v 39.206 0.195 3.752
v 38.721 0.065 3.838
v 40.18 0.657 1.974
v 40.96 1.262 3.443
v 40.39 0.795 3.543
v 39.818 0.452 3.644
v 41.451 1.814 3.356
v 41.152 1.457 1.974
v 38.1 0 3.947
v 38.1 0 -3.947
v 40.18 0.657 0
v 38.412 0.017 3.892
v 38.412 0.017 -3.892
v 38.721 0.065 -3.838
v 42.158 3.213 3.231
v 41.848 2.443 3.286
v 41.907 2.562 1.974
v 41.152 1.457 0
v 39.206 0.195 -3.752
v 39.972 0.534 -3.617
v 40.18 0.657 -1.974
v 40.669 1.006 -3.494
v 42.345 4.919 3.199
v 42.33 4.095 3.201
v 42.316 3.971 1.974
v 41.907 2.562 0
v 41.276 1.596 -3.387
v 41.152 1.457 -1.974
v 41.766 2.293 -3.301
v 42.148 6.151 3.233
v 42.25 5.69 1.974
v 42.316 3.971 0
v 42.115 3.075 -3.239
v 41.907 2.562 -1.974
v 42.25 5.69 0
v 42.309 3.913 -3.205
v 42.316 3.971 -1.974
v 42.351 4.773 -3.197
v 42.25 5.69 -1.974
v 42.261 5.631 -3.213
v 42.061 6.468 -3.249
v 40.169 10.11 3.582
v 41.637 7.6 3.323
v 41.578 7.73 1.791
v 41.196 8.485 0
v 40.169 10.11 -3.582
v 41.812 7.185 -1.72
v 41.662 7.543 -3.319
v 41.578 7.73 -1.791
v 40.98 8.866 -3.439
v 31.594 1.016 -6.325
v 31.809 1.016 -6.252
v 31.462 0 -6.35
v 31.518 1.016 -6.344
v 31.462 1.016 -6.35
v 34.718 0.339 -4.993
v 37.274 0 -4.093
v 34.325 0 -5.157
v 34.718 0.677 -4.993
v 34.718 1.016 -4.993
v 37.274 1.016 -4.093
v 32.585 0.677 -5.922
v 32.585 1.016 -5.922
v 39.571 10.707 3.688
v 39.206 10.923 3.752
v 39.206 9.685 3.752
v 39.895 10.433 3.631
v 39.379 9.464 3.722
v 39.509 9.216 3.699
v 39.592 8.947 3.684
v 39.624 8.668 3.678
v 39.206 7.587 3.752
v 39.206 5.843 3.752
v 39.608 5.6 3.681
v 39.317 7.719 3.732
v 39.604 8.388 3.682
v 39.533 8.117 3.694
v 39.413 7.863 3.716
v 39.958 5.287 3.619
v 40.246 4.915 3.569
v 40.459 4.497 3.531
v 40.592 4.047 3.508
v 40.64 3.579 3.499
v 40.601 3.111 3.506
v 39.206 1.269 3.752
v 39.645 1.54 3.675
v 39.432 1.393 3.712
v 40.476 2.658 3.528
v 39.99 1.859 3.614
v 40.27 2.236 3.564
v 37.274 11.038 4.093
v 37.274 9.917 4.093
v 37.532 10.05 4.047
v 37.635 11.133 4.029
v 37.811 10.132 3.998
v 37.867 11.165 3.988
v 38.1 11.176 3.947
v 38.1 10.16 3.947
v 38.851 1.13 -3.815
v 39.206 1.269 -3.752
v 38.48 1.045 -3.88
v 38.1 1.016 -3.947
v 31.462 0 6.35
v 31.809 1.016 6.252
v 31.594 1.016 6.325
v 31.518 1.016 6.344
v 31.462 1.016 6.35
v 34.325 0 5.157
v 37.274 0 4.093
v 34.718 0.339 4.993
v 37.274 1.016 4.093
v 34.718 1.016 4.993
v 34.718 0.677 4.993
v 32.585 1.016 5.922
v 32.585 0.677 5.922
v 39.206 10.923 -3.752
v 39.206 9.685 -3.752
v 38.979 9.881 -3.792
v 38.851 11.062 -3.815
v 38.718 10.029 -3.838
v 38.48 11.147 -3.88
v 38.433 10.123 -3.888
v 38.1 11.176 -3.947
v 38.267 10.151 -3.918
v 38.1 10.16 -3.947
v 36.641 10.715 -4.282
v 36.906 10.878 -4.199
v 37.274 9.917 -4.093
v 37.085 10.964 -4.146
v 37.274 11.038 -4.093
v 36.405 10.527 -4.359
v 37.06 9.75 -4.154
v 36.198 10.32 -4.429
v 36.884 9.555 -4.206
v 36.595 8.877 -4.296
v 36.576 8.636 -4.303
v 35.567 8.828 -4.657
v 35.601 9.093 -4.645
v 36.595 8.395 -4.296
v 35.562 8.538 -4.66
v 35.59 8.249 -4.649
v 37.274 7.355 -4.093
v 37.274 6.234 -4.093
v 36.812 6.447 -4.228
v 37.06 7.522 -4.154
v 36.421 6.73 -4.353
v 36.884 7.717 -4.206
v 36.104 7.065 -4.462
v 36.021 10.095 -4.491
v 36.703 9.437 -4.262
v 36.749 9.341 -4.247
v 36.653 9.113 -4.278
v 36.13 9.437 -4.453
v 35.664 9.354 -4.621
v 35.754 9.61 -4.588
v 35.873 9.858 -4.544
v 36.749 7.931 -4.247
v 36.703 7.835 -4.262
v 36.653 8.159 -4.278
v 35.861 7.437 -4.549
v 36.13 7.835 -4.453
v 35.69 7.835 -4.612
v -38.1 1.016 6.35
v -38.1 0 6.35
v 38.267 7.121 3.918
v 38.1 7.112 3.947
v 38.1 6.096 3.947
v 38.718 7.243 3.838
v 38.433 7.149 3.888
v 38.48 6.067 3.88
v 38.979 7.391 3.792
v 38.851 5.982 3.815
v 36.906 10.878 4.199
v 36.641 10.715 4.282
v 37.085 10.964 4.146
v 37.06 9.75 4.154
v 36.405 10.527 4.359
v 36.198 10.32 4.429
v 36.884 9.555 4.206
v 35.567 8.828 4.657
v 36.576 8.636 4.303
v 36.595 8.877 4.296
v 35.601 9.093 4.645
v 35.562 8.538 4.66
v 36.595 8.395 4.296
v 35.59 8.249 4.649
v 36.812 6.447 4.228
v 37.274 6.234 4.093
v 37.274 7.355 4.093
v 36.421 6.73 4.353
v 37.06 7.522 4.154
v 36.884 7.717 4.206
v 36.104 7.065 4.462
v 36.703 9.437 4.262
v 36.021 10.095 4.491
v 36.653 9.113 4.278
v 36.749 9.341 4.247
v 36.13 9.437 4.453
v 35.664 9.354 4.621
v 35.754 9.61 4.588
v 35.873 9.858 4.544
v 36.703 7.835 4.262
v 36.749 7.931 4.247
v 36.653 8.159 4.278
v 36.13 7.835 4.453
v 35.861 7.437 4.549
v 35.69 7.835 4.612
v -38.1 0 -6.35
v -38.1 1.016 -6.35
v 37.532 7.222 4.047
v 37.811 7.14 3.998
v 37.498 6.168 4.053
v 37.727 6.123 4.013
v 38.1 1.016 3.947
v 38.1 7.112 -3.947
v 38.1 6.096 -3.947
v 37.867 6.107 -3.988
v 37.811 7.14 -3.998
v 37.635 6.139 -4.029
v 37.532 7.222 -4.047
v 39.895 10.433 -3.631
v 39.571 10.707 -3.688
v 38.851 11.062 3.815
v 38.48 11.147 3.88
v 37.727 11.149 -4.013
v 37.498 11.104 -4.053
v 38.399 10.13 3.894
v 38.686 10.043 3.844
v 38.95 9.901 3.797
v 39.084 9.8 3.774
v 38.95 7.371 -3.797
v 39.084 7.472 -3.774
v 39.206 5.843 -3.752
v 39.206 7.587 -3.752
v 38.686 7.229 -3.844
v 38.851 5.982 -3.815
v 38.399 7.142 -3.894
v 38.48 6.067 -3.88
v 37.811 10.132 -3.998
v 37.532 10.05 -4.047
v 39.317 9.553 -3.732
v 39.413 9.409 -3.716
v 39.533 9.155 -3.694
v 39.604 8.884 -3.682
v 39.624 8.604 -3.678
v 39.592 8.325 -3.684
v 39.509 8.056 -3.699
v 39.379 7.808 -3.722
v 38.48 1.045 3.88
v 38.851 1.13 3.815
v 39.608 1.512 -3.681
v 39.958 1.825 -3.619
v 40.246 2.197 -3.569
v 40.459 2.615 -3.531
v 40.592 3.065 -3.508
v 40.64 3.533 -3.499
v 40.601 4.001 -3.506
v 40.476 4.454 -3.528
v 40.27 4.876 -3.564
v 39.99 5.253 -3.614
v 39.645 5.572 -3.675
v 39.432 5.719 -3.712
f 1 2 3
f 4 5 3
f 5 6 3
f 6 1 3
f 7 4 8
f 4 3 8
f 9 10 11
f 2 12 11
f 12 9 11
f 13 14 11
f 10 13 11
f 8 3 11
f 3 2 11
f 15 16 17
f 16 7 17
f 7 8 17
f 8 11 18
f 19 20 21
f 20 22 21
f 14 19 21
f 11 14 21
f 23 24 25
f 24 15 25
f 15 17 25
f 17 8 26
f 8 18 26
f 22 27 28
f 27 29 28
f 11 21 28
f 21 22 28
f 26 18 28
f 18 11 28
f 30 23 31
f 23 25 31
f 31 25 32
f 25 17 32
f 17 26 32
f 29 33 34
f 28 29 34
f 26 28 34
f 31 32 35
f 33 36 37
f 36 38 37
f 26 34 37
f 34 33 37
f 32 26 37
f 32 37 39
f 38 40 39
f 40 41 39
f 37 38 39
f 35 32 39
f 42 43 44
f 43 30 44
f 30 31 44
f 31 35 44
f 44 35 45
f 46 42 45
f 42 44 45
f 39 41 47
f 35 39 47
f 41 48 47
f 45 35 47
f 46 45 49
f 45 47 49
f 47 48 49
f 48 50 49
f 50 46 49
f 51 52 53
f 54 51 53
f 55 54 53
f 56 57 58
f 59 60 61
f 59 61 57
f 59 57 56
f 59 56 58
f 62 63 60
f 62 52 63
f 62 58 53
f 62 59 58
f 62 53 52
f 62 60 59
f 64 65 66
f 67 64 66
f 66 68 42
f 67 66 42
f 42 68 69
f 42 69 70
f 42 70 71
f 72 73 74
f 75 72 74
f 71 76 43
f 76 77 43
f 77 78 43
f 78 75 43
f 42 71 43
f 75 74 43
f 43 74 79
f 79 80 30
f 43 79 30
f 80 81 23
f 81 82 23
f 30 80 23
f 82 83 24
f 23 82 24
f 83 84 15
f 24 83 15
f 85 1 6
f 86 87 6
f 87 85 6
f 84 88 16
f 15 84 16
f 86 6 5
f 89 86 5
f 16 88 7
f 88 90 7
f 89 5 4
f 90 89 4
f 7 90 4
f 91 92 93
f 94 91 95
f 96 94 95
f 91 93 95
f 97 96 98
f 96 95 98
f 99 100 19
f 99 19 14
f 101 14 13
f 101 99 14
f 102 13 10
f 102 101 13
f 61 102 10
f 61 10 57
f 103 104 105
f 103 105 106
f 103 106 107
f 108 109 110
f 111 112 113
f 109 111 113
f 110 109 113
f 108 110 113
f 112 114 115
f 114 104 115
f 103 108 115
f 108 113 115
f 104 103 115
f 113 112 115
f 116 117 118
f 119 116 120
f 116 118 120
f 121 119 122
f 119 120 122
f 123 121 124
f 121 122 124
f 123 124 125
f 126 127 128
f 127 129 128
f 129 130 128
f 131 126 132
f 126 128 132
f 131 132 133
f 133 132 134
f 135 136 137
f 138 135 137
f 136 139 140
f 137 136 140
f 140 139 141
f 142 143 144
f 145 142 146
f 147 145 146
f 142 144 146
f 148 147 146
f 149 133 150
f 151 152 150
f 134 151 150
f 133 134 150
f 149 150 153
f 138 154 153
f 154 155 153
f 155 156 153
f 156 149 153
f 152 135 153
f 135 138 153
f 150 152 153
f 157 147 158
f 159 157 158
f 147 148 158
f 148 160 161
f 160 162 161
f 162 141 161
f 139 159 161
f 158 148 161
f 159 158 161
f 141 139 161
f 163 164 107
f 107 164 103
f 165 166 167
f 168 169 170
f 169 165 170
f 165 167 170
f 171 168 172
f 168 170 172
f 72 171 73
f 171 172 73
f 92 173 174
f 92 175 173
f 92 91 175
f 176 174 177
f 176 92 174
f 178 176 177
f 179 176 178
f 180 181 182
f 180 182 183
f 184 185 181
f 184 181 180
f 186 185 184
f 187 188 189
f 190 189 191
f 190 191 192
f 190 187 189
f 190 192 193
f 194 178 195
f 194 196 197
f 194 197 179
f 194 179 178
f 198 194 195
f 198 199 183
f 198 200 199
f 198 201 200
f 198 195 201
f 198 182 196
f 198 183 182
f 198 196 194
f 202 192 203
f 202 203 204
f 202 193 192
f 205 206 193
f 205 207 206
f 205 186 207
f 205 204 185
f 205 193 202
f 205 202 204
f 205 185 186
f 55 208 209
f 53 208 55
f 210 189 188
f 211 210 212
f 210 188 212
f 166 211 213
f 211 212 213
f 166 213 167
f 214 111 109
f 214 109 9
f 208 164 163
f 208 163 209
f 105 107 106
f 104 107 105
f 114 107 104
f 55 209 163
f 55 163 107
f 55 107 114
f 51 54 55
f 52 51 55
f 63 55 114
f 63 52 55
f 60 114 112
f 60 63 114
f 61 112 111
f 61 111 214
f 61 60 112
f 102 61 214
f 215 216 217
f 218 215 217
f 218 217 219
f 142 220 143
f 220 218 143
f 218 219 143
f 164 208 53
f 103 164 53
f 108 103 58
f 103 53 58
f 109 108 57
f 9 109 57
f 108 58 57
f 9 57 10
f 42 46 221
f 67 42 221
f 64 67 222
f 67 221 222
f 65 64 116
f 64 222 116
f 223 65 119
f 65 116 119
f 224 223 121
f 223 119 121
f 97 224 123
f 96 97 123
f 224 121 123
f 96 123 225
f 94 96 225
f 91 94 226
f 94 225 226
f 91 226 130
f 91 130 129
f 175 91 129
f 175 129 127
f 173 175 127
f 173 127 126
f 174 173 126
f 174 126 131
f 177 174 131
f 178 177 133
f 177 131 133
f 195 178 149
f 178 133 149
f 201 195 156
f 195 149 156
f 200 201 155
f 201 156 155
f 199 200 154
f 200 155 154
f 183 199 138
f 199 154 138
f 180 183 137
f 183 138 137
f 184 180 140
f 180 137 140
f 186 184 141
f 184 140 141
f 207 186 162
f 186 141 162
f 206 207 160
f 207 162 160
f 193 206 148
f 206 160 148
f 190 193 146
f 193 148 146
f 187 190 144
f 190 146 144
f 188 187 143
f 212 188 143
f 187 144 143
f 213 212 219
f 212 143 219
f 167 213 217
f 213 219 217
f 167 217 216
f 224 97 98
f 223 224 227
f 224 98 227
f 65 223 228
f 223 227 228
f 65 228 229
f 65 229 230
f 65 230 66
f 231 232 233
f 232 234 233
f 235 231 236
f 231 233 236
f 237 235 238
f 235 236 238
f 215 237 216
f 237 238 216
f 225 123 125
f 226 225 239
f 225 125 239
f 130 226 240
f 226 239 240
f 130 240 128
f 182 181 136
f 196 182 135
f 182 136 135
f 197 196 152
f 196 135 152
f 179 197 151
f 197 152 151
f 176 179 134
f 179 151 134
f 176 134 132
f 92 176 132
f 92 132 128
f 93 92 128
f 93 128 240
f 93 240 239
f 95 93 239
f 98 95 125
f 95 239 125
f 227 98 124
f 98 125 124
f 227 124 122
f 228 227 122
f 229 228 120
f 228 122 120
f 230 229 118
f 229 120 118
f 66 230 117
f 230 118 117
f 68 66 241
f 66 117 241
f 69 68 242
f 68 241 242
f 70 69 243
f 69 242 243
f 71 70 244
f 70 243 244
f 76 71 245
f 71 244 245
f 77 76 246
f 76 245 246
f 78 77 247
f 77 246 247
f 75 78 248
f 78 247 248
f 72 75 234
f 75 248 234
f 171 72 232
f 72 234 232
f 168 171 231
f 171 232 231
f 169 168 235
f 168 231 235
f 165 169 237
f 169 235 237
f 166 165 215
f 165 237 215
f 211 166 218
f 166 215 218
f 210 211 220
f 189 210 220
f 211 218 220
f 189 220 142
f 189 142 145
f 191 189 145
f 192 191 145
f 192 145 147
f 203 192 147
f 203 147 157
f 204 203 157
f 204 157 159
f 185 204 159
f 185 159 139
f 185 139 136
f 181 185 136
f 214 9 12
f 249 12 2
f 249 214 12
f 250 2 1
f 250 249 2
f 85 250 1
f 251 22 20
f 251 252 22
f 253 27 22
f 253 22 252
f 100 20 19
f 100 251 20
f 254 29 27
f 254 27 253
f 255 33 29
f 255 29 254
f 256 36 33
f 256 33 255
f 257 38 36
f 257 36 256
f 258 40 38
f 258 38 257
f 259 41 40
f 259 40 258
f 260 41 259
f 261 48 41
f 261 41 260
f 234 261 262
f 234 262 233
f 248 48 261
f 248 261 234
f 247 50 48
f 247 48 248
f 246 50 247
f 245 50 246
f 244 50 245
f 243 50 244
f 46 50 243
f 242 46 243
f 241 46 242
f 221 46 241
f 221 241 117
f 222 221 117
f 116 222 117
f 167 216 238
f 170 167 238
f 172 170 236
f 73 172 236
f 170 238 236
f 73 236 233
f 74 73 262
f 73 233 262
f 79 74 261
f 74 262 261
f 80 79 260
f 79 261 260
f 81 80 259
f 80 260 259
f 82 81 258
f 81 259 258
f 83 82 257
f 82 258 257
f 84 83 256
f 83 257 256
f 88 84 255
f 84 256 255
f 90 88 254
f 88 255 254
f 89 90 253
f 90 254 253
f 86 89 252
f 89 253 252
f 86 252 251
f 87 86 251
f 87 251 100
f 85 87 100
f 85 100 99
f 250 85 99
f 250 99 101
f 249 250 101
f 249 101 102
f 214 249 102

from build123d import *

# Parameters (mm, degrees)
SKETCH1_W               = 76.2
SKETCH1_H               = 12.7
BOSS_EXTRUDE1_DEPTH     = 1.016
SKETCH2_R               = 1.524
BOSS_EXTRUDE2_DEPTH     = 12.7
CUT_EXTRUDE1_DEPTH      = 10
CUT_EXTRUDE1_DEPTH_BACK = 11.1600001


with BuildPart() as part:
    # Sketch1 → Boss-Extrude1 (new body)
    with BuildSketch(Plane(origin=(0, 0, 0), x_dir=(1, 0, 0), z_dir=(0, 1, 0))):
        Rectangle(SKETCH1_W, SKETCH1_H)
    extrude(amount=BOSS_EXTRUDE1_DEPTH)

    # Sketch2 → Boss-Extrude2 (add, through all)
    with BuildSketch(Plane(origin=(0, 0, -6.35), x_dir=(-1, 0, 0), z_dir=(0, 0, -1))):
        with BuildLine():
            Line((38.1, 1.016), (38.1, 0))
            Line((38.1, 0), (-38.1, 0))
            add(Edge.make_bspline(
                [(-38.1, 0), (-40.015605578, 0), (-42.822592097, 1.815276702), (-43.811105253, 4.997519765), (-40.168646494, 10.109873022)],
                knots=[0, 0, 0, 0, 0, 1, 1, 1, 1, 1], degree=4))
            ThreePointArc((-40.168646494, 10.109873022), (-35.842209324, 9.799607005), (-38.1, 6.096))
            ThreePointArc((-38.1, 6.096), (-40.64, 3.556), (-38.1, 1.016))
            Line((-38.1, 1.016), (38.1, 1.016))
        make_face()
        with Locations((-38.1, 8.636)):
            Circle(SKETCH2_R, mode=Mode.SUBTRACT)
    extrude(amount=-BOSS_EXTRUDE2_DEPTH)

    # Sketch3 → Cut-Extrude1 (cut, two sides)
    with BuildSketch(Plane.XZ.offset(-1.016)) as cut_extrude1_sk:
        with BuildLine():
            Line((38.1, -6.35), (38.1, -3.947075763))
            Line((38.1, -3.947075763), (37.273899924, -4.092739495))
            add(Edge.make_bspline(
                [(37.273899924, -4.092739495), (34.703704114, -4.800647246), (31.882848561, -6.35), (31.461872823, -6.35)],
                knots=[0.208615082, 0.208615082, 0.208615082, 0.208615082, 1, 1, 1, 1], degree=3))
            Line((31.461872823, -6.35), (38.1, -6.35))
        make_face()
        Polygon((42.354063476, -3.196969595), (39.205663033, -3.752117539), (38.1, -3.947075763), (38.1, -6.35), (42.354063476, -6.35), align=None)
        Polygon((38.1, 3.947075763), (39.205663033, 3.752117539), (42.354063476, 3.196969595), (42.354063476, 6.35), (38.1, 6.35), align=None)
        with BuildLine():
            Line((37.273899924, 4.092739495), (38.1, 3.947075763))
            Line((38.1, 3.947075763), (38.1, 6.35))
            Line((38.1, 6.35), (31.461872823, 6.35))
            add(Edge.make_bspline(
                [(37.273899924, 4.092739495), (34.703704114, 4.800647246), (31.882848561, 6.35), (31.461872823, 6.35)],
                knots=[0.208615082, 0.208615082, 0.208615082, 0.208615082, 1, 1, 1, 1], degree=3))
        make_face()
    extrude(amount=CUT_EXTRUDE1_DEPTH, mode=Mode.SUBTRACT)
    extrude(cut_extrude1_sk.sketch, amount=-CUT_EXTRUDE1_DEPTH_BACK, mode=Mode.SUBTRACT)


solid = part.part
